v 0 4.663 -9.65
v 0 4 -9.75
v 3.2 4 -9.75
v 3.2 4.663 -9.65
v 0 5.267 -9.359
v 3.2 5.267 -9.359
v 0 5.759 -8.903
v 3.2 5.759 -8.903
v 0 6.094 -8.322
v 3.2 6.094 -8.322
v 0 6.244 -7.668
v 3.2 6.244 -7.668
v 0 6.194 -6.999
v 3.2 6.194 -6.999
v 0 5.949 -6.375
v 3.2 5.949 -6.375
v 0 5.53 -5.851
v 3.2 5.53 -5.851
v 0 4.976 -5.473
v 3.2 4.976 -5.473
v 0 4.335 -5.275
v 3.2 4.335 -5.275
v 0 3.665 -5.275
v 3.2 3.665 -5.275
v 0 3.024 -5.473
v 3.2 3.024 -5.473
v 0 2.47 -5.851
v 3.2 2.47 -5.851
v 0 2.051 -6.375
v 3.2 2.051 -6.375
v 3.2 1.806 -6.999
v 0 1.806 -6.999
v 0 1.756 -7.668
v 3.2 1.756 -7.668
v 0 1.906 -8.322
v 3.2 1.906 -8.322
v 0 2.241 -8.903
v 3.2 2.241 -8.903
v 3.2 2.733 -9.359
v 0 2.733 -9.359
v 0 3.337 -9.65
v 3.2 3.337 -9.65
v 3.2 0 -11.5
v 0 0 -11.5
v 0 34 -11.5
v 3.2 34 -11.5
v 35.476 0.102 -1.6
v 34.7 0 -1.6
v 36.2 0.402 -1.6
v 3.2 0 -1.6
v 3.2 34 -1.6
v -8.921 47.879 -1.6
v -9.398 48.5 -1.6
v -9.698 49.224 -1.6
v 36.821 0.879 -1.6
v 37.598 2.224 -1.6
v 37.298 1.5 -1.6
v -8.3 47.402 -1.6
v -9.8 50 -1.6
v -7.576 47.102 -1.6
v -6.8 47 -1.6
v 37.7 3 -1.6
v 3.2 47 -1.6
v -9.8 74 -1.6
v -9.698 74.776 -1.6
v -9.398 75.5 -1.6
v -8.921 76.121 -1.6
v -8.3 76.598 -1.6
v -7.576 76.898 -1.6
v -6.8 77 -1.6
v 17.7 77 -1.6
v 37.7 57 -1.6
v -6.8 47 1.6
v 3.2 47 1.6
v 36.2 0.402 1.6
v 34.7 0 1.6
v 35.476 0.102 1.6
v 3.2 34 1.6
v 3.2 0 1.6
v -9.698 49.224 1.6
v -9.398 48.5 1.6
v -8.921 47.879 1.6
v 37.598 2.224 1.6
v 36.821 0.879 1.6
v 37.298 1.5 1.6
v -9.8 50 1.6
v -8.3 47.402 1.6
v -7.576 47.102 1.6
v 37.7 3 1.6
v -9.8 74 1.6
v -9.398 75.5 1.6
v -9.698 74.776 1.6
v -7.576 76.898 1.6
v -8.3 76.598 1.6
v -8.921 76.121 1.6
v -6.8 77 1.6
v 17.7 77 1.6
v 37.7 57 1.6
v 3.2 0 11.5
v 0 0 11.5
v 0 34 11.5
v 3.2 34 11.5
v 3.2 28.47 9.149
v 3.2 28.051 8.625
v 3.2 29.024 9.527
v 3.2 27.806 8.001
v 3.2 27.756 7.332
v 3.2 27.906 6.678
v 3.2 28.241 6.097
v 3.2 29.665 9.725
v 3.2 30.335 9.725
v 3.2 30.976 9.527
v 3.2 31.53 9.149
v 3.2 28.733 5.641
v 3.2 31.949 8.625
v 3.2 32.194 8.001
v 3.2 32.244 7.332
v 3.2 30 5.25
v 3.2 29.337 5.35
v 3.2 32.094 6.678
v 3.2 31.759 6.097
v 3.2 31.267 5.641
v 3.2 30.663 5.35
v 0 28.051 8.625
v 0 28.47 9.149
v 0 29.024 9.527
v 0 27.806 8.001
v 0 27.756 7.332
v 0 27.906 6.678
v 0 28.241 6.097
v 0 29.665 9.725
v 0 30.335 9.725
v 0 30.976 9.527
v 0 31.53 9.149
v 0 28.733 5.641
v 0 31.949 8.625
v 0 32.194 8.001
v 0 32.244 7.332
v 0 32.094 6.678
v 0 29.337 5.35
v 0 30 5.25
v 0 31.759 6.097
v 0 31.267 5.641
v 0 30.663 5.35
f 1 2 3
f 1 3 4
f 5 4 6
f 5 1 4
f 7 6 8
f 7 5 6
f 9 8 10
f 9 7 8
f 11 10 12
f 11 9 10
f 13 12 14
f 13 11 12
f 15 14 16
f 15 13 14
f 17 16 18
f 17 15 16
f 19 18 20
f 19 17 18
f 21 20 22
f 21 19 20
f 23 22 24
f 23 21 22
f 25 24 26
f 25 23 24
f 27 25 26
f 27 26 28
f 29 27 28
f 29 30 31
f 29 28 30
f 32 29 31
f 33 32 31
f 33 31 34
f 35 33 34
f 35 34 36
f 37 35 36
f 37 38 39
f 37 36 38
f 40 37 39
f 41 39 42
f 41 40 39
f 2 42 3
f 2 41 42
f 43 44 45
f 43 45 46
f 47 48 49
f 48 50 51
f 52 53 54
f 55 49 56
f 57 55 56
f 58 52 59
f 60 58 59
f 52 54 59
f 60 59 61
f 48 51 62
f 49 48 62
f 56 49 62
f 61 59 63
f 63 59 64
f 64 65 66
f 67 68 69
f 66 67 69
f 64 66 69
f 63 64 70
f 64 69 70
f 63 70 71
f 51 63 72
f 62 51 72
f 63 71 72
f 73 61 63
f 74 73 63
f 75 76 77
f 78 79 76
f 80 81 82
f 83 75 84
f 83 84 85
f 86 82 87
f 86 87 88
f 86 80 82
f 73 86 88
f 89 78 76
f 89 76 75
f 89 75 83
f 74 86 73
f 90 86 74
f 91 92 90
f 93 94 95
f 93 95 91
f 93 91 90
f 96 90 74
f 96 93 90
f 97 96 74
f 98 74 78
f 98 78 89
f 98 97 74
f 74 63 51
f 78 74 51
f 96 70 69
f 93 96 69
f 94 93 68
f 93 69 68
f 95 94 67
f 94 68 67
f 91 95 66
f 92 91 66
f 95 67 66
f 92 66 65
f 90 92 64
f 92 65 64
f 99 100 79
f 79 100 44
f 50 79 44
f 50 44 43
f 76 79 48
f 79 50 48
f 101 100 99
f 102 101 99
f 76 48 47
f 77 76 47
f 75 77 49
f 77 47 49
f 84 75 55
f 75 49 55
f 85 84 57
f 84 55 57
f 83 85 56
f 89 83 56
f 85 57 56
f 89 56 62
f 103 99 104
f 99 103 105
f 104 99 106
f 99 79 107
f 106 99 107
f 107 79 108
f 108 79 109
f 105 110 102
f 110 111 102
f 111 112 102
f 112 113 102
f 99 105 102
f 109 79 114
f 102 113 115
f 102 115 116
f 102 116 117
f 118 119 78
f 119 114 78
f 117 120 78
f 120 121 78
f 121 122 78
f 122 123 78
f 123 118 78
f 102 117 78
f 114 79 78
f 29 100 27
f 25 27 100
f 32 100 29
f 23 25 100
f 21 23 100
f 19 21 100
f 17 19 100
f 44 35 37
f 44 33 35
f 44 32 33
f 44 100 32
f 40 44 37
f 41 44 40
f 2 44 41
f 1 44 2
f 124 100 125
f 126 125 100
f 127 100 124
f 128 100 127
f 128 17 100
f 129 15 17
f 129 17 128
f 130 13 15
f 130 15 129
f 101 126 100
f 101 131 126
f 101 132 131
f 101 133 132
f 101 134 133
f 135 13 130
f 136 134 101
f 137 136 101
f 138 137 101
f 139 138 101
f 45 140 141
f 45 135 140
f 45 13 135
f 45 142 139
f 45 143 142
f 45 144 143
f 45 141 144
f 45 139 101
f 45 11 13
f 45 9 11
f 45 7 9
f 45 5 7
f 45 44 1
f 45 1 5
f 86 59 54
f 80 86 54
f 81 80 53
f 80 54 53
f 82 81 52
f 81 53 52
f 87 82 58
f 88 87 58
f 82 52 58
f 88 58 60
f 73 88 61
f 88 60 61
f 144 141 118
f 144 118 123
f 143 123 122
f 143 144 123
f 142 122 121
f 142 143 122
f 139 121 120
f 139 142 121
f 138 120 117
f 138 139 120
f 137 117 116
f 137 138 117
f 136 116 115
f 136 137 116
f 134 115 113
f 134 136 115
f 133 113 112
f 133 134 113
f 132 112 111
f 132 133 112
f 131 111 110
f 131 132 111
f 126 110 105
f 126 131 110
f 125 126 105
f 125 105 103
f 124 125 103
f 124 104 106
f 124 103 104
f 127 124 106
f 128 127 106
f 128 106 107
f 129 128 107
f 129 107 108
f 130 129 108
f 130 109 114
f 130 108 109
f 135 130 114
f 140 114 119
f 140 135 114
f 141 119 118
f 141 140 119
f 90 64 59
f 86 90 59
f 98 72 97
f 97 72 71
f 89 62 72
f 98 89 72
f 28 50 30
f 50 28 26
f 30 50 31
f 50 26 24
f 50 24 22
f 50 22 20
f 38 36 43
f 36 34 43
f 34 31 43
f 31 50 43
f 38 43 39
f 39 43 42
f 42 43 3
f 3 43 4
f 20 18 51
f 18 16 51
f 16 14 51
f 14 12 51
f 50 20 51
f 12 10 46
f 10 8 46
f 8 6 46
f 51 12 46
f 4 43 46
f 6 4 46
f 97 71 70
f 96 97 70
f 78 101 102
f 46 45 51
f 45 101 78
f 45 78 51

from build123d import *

# Parameters (mm, degrees)
EXTRUDE_1_DEPTH          = 1.6
EXTRUDE_1_DEPTH_BACK     = 1.6
EXTRUDE_2_DEPTH          = 11.5
EXTRUDE_2_DEPTH_BACK     = 11.5
SKETCH_2_W               = 3.2
SKETCH_2_H               = 34
CUT_EXTRUDE_1_DEPTH      = 87.501676284
CUT_EXTRUDE_1_DEPTH_BACK = 87.501676284
SKETCH_3_R               = 2.25


with BuildPart() as part:
    # ｽｹｯﾁ1 → ﾎﾞｽ - 押し出し1 (new, two sides: drawn at the far end of the back side and taken through both)
    with BuildSketch(Plane.XY.offset(-EXTRUDE_1_DEPTH_BACK)):
        with BuildLine():
            Line((3.2, 0), (34.7, 0))
            ThreePointArc((34.7, 0), (36.821320344, 0.878679656), (37.7, 3))
            Line((37.7, 3), (37.7, 57))
            Line((37.7, 57), (17.7, 77))
            Line((17.7, 77), (-6.8, 77))
            ThreePointArc((-6.8, 77), (-8.921320344, 76.121320344), (-9.8, 74))
            Line((-9.8, 74), (-9.8, 50))
            ThreePointArc((-9.8, 50), (-8.921320344, 47.878679656), (-6.8, 47))
            Line((-6.8, 47), (3.2, 47))
            Line((3.2, 47), (3.2, 0))
        make_face()
    extrude(amount=EXTRUDE_1_DEPTH + EXTRUDE_1_DEPTH_BACK)

    # ｽｹｯﾁ2 → ﾎﾞｽ - 押し出し2 (add, two sides: drawn at the far end of the back side and taken through both)
    with BuildSketch(Plane.XY.offset(-EXTRUDE_2_DEPTH_BACK)):
        with Locations((1.6, 17)):
            Rectangle(SKETCH_2_W, SKETCH_2_H)
    extrude(amount=EXTRUDE_2_DEPTH + EXTRUDE_2_DEPTH_BACK)

    # ｽｹｯﾁ3 → ｶｯﾄ - 押し出し1 (cut, two sides: drawn at the far end of the back side and taken through both)
    with BuildSketch(Plane(origin=(0, 0, 0), x_dir=(0, 0, -1), z_dir=(1, 0, 0)).offset(-CUT_EXTRUDE_1_DEPTH_BACK)):
        with Locations((-7.5, 30)):
            Circle(SKETCH_3_R)
        with Locations((7.5, 4)):
            Circle(SKETCH_3_R)
    extrude(amount=CUT_EXTRUDE_1_DEPTH + CUT_EXTRUDE_1_DEPTH_BACK, mode=Mode.SUBTRACT)


solid = part.part
